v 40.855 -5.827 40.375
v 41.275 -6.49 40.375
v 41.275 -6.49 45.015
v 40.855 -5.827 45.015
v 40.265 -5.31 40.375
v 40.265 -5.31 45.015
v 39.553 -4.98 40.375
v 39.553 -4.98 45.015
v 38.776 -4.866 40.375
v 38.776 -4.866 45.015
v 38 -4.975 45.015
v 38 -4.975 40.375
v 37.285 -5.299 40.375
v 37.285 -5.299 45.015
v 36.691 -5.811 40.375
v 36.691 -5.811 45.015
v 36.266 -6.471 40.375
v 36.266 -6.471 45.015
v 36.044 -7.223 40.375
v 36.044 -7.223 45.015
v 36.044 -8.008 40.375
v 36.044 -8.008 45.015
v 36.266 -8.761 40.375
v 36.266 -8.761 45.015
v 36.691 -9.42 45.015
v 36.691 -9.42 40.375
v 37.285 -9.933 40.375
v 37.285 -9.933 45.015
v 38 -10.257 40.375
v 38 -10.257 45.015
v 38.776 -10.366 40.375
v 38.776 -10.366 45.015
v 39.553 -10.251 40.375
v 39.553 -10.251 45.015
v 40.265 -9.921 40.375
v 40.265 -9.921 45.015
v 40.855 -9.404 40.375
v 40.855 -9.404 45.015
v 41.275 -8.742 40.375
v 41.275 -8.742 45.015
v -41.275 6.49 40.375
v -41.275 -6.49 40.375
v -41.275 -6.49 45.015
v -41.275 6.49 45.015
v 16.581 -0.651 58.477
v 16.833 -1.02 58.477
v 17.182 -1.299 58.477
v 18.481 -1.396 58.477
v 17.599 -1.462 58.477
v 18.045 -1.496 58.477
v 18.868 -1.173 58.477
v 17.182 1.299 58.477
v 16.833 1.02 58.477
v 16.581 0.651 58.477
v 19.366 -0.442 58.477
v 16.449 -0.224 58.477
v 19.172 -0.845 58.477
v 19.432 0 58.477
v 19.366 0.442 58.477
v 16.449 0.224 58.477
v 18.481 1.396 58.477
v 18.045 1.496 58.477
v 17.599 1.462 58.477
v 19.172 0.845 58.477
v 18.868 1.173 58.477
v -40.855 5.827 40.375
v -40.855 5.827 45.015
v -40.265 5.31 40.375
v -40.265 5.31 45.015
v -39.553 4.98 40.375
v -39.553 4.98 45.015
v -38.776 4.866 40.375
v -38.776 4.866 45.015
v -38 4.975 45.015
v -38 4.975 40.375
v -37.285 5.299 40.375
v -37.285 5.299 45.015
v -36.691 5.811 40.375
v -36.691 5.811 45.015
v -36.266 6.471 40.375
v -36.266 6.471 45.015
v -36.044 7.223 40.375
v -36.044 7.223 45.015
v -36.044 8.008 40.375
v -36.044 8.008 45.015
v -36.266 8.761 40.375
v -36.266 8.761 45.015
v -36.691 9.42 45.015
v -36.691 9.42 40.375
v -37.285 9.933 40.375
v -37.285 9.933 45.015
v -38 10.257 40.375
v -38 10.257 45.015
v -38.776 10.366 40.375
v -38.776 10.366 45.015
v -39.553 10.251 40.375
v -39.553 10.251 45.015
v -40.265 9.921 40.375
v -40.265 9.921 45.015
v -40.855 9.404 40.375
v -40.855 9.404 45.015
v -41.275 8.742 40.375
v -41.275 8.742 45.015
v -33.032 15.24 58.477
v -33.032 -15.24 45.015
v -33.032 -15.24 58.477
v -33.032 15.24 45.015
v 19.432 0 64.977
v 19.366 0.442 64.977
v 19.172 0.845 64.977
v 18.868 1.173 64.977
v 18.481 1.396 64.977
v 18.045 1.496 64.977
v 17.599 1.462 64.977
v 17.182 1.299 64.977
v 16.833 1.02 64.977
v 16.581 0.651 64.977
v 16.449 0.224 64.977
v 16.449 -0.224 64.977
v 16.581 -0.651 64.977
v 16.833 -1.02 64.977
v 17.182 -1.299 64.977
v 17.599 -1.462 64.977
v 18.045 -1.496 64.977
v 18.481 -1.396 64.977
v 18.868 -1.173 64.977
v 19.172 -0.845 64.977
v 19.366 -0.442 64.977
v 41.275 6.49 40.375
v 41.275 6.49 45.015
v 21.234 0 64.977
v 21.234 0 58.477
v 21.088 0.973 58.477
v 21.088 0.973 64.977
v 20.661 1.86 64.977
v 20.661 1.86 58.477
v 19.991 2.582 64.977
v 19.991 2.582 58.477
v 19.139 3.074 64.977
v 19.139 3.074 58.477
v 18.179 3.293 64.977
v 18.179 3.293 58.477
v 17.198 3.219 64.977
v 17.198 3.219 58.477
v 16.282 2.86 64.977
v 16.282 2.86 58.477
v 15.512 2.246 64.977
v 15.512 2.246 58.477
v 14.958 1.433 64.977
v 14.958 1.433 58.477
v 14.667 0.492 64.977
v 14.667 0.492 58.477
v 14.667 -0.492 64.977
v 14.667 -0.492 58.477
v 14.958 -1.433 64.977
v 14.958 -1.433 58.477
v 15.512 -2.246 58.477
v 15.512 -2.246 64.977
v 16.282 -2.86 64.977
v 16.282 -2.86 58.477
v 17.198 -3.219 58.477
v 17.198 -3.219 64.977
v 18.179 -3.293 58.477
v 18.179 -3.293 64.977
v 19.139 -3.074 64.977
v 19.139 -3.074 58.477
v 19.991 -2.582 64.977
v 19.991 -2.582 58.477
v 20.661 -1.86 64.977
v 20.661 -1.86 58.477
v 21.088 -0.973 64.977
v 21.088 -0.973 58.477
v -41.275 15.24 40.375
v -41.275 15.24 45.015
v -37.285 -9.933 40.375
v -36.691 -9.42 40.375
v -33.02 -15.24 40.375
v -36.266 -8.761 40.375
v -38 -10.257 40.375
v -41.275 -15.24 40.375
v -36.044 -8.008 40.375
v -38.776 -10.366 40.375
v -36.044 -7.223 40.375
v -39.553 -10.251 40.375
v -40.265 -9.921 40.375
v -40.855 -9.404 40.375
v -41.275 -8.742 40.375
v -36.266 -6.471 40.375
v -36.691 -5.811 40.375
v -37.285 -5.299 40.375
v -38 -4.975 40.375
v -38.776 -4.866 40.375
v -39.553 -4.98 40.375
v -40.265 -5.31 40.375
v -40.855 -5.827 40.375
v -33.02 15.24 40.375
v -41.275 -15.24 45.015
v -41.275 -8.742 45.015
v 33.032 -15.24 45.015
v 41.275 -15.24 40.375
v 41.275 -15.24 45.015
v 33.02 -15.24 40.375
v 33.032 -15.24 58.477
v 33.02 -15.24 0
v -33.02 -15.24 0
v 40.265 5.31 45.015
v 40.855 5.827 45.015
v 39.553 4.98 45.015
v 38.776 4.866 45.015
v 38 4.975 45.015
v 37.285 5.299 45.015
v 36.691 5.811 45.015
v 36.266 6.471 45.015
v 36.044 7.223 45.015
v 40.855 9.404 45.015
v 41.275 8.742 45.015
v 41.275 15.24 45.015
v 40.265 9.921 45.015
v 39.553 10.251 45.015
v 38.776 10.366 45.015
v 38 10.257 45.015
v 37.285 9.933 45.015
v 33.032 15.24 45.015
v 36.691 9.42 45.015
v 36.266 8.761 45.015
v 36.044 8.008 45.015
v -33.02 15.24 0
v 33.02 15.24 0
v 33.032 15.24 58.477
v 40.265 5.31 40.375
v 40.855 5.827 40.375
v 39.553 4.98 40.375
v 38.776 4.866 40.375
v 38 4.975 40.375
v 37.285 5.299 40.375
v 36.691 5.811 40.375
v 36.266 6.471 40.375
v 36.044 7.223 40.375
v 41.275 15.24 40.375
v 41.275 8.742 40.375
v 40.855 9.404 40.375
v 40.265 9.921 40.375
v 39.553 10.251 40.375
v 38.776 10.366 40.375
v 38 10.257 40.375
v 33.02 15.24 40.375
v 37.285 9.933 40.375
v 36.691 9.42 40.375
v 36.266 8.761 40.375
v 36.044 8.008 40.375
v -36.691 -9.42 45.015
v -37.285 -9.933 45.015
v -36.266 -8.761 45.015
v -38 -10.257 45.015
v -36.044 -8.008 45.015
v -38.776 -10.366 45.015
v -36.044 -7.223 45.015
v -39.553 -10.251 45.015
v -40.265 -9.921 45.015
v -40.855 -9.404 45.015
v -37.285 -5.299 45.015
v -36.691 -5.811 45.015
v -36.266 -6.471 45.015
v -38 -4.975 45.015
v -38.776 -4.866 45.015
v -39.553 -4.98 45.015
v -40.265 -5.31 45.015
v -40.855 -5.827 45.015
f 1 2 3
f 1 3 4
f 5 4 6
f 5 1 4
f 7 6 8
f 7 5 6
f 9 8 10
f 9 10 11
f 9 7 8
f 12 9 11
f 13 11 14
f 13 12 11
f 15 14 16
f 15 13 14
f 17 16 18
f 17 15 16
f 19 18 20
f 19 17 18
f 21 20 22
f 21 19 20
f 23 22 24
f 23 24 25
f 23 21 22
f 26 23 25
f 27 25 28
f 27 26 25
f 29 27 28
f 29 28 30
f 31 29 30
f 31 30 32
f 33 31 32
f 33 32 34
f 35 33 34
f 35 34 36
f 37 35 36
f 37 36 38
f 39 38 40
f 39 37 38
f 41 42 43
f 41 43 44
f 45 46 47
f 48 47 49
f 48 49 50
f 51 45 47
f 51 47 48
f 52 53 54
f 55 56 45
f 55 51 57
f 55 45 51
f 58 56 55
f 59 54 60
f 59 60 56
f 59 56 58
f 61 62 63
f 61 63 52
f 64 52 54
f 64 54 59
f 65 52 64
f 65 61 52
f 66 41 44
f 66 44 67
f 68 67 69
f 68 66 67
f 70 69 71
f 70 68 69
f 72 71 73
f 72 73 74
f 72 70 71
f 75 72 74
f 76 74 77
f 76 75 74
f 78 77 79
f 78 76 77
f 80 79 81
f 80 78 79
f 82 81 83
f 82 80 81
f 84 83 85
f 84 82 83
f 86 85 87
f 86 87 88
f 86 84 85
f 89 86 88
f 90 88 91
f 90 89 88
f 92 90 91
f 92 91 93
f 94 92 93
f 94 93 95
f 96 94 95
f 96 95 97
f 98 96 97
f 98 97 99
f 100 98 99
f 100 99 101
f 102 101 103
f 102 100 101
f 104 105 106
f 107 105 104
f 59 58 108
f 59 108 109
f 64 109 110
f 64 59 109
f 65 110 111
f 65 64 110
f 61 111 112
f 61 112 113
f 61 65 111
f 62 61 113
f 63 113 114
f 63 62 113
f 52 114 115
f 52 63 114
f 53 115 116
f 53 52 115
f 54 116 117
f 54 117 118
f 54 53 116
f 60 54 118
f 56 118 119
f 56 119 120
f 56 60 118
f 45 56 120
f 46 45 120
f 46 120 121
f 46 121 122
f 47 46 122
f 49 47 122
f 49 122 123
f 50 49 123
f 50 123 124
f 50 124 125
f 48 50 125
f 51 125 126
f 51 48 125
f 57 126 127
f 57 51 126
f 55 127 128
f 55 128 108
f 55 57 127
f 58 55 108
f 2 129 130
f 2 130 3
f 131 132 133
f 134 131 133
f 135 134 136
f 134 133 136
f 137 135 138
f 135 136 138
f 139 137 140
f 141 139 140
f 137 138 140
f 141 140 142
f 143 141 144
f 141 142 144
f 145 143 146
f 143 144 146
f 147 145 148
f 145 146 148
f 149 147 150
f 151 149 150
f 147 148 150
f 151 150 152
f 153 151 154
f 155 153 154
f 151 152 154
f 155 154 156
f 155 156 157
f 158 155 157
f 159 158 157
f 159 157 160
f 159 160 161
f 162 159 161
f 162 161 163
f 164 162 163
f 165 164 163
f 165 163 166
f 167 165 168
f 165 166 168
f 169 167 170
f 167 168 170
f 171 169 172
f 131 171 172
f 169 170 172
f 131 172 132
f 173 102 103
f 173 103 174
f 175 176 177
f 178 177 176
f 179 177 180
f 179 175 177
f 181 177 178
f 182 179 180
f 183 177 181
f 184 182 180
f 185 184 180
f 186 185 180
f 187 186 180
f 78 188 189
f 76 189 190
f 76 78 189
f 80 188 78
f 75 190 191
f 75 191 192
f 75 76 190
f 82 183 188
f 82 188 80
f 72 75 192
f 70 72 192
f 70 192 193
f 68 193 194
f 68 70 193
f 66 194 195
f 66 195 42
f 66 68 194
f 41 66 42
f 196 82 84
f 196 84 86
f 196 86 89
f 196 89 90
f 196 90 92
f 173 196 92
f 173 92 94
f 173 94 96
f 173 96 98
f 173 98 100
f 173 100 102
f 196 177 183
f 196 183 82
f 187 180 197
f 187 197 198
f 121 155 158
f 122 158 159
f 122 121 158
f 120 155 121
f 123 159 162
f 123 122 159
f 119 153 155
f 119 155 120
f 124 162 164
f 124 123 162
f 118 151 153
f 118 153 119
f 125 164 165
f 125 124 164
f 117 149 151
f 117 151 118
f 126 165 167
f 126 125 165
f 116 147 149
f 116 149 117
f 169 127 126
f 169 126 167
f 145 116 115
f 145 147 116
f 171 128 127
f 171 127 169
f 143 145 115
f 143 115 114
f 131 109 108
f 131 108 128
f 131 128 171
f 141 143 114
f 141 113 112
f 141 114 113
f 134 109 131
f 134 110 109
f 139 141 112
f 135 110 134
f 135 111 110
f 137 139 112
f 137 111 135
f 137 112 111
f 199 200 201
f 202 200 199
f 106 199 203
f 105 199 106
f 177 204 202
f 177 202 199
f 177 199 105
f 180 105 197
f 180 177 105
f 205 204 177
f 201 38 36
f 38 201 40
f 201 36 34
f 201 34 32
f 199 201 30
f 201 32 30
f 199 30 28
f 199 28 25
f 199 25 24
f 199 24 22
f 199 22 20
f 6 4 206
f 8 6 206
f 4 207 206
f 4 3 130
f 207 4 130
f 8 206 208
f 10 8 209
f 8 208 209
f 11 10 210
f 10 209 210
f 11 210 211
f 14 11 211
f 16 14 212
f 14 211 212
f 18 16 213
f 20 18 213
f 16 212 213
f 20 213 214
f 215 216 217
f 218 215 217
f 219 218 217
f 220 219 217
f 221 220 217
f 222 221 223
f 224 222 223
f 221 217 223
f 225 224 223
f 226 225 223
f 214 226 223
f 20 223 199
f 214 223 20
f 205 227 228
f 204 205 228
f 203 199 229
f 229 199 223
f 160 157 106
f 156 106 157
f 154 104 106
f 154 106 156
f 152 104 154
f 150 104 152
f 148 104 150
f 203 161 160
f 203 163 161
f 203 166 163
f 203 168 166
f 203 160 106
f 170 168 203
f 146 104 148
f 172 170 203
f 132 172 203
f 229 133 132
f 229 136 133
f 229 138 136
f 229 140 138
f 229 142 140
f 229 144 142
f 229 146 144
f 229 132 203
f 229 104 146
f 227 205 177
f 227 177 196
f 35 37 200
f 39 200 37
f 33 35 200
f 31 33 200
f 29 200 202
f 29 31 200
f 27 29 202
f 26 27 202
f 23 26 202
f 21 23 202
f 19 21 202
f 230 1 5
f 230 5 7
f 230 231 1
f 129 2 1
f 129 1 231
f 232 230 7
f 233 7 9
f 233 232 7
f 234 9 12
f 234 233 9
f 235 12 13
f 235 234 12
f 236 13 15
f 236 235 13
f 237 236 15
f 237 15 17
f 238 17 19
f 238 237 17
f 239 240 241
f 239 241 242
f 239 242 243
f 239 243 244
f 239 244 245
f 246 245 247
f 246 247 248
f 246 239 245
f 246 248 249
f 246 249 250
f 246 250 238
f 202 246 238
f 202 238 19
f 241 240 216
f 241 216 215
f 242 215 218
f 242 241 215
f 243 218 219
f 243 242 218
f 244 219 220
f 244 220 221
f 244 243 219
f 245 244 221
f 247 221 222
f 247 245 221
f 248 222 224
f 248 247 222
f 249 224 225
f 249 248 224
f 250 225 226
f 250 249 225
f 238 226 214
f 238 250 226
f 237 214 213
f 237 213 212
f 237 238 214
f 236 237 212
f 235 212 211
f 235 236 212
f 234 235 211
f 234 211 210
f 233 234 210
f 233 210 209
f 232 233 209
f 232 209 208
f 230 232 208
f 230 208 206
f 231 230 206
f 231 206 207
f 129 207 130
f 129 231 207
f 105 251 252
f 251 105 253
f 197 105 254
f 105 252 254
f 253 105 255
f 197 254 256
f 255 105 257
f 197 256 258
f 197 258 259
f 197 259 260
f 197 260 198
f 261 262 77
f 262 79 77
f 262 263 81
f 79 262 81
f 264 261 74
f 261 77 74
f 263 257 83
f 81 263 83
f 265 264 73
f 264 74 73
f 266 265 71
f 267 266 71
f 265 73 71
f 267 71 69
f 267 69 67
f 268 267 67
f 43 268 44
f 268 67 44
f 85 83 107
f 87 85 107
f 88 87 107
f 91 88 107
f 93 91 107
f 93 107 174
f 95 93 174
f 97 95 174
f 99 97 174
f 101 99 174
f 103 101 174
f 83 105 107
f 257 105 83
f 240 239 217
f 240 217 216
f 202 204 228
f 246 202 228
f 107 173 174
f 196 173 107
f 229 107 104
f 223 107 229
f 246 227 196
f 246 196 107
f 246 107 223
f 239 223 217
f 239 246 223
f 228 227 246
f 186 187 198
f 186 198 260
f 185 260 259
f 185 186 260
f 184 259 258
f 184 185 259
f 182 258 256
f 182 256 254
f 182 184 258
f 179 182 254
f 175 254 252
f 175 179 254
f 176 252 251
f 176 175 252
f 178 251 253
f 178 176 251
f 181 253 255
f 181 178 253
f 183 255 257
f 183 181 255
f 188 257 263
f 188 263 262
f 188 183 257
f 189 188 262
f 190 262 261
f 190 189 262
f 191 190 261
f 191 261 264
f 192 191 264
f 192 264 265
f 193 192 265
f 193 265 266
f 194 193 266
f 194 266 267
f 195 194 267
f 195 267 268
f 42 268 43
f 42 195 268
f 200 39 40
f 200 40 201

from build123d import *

# Parameters (mm, degrees)
SKETCH_1_W       = 66.04
SKETCH_1_H       = 30.48
EXTRUDE_1_DEPTH  = 40.3754
EXTRUDE_11_DEPTH = 4.64
SKETCH_3_W       = 66.06472
SKETCH_3_H       = 30.48
EXTRUDE_12_DEPTH = 13.462
SKETCH_5_R       = 3.302
SKETCH_5_R_2     = 1.5
EXTRUDE_13_DEPTH = 6.5


with BuildPart() as part:
    # 스케치1 → 보스-돌출1 (new body)
    with BuildSketch(Plane.XY):
        Rectangle(SKETCH_1_W, SKETCH_1_H)
    extrude(amount=EXTRUDE_1_DEPTH)

    # 스케치2 → 보스-돌출11 (add)
    with BuildSketch(Plane.XY.offset(40.3754)):
        with BuildLine():
            Line((41.275, -8.74168445), (41.275, -15.24))
            Line((41.275, -15.24), (-41.275, -15.24))
            Line((-41.275, -15.24), (-41.275, -8.74168445))
            ThreePointArc((-41.275, -8.74168445), (-36.01612, -7.61562), (-41.275, -6.48955555))
            Line((-41.275, -6.48955555), (-41.275, 6.48955555))
            ThreePointArc((-41.275, 6.48955555), (-36.01612, 7.61562), (-41.275, 8.74168445))
            Line((-41.275, 8.74168445), (-41.275, 15.24))
            Line((-41.275, 15.24), (41.275, 15.24))
            Line((41.275, 15.24), (41.275, 8.74168445))
            ThreePointArc((41.275, 8.74168445), (36.01612, 7.61562), (41.275, 6.48955555))
            Line((41.275, 6.48955555), (41.275, -6.48955555))
            ThreePointArc((41.275, -6.48955555), (36.01612, -7.61562), (41.275, -8.74168445))
        make_face()
    extrude(amount=EXTRUDE_11_DEPTH)

    # 스케치3 → 보스-돌출12 (add)
    with BuildSketch(Plane.XY.offset(45.0154)):
        Rectangle(SKETCH_3_W, SKETCH_3_H)
    extrude(amount=EXTRUDE_12_DEPTH)

    # 스케치5 → 보스-돌출13 (add)
    with BuildSketch(Plane.XY.offset(58.4774)):
        with Locations((17.9325, 0)):
            Circle(SKETCH_5_R)
        with Locations((17.9325, 0)):
            Circle(SKETCH_5_R_2, mode=Mode.SUBTRACT)
    extrude(amount=EXTRUDE_13_DEPTH)


solid = part.part
